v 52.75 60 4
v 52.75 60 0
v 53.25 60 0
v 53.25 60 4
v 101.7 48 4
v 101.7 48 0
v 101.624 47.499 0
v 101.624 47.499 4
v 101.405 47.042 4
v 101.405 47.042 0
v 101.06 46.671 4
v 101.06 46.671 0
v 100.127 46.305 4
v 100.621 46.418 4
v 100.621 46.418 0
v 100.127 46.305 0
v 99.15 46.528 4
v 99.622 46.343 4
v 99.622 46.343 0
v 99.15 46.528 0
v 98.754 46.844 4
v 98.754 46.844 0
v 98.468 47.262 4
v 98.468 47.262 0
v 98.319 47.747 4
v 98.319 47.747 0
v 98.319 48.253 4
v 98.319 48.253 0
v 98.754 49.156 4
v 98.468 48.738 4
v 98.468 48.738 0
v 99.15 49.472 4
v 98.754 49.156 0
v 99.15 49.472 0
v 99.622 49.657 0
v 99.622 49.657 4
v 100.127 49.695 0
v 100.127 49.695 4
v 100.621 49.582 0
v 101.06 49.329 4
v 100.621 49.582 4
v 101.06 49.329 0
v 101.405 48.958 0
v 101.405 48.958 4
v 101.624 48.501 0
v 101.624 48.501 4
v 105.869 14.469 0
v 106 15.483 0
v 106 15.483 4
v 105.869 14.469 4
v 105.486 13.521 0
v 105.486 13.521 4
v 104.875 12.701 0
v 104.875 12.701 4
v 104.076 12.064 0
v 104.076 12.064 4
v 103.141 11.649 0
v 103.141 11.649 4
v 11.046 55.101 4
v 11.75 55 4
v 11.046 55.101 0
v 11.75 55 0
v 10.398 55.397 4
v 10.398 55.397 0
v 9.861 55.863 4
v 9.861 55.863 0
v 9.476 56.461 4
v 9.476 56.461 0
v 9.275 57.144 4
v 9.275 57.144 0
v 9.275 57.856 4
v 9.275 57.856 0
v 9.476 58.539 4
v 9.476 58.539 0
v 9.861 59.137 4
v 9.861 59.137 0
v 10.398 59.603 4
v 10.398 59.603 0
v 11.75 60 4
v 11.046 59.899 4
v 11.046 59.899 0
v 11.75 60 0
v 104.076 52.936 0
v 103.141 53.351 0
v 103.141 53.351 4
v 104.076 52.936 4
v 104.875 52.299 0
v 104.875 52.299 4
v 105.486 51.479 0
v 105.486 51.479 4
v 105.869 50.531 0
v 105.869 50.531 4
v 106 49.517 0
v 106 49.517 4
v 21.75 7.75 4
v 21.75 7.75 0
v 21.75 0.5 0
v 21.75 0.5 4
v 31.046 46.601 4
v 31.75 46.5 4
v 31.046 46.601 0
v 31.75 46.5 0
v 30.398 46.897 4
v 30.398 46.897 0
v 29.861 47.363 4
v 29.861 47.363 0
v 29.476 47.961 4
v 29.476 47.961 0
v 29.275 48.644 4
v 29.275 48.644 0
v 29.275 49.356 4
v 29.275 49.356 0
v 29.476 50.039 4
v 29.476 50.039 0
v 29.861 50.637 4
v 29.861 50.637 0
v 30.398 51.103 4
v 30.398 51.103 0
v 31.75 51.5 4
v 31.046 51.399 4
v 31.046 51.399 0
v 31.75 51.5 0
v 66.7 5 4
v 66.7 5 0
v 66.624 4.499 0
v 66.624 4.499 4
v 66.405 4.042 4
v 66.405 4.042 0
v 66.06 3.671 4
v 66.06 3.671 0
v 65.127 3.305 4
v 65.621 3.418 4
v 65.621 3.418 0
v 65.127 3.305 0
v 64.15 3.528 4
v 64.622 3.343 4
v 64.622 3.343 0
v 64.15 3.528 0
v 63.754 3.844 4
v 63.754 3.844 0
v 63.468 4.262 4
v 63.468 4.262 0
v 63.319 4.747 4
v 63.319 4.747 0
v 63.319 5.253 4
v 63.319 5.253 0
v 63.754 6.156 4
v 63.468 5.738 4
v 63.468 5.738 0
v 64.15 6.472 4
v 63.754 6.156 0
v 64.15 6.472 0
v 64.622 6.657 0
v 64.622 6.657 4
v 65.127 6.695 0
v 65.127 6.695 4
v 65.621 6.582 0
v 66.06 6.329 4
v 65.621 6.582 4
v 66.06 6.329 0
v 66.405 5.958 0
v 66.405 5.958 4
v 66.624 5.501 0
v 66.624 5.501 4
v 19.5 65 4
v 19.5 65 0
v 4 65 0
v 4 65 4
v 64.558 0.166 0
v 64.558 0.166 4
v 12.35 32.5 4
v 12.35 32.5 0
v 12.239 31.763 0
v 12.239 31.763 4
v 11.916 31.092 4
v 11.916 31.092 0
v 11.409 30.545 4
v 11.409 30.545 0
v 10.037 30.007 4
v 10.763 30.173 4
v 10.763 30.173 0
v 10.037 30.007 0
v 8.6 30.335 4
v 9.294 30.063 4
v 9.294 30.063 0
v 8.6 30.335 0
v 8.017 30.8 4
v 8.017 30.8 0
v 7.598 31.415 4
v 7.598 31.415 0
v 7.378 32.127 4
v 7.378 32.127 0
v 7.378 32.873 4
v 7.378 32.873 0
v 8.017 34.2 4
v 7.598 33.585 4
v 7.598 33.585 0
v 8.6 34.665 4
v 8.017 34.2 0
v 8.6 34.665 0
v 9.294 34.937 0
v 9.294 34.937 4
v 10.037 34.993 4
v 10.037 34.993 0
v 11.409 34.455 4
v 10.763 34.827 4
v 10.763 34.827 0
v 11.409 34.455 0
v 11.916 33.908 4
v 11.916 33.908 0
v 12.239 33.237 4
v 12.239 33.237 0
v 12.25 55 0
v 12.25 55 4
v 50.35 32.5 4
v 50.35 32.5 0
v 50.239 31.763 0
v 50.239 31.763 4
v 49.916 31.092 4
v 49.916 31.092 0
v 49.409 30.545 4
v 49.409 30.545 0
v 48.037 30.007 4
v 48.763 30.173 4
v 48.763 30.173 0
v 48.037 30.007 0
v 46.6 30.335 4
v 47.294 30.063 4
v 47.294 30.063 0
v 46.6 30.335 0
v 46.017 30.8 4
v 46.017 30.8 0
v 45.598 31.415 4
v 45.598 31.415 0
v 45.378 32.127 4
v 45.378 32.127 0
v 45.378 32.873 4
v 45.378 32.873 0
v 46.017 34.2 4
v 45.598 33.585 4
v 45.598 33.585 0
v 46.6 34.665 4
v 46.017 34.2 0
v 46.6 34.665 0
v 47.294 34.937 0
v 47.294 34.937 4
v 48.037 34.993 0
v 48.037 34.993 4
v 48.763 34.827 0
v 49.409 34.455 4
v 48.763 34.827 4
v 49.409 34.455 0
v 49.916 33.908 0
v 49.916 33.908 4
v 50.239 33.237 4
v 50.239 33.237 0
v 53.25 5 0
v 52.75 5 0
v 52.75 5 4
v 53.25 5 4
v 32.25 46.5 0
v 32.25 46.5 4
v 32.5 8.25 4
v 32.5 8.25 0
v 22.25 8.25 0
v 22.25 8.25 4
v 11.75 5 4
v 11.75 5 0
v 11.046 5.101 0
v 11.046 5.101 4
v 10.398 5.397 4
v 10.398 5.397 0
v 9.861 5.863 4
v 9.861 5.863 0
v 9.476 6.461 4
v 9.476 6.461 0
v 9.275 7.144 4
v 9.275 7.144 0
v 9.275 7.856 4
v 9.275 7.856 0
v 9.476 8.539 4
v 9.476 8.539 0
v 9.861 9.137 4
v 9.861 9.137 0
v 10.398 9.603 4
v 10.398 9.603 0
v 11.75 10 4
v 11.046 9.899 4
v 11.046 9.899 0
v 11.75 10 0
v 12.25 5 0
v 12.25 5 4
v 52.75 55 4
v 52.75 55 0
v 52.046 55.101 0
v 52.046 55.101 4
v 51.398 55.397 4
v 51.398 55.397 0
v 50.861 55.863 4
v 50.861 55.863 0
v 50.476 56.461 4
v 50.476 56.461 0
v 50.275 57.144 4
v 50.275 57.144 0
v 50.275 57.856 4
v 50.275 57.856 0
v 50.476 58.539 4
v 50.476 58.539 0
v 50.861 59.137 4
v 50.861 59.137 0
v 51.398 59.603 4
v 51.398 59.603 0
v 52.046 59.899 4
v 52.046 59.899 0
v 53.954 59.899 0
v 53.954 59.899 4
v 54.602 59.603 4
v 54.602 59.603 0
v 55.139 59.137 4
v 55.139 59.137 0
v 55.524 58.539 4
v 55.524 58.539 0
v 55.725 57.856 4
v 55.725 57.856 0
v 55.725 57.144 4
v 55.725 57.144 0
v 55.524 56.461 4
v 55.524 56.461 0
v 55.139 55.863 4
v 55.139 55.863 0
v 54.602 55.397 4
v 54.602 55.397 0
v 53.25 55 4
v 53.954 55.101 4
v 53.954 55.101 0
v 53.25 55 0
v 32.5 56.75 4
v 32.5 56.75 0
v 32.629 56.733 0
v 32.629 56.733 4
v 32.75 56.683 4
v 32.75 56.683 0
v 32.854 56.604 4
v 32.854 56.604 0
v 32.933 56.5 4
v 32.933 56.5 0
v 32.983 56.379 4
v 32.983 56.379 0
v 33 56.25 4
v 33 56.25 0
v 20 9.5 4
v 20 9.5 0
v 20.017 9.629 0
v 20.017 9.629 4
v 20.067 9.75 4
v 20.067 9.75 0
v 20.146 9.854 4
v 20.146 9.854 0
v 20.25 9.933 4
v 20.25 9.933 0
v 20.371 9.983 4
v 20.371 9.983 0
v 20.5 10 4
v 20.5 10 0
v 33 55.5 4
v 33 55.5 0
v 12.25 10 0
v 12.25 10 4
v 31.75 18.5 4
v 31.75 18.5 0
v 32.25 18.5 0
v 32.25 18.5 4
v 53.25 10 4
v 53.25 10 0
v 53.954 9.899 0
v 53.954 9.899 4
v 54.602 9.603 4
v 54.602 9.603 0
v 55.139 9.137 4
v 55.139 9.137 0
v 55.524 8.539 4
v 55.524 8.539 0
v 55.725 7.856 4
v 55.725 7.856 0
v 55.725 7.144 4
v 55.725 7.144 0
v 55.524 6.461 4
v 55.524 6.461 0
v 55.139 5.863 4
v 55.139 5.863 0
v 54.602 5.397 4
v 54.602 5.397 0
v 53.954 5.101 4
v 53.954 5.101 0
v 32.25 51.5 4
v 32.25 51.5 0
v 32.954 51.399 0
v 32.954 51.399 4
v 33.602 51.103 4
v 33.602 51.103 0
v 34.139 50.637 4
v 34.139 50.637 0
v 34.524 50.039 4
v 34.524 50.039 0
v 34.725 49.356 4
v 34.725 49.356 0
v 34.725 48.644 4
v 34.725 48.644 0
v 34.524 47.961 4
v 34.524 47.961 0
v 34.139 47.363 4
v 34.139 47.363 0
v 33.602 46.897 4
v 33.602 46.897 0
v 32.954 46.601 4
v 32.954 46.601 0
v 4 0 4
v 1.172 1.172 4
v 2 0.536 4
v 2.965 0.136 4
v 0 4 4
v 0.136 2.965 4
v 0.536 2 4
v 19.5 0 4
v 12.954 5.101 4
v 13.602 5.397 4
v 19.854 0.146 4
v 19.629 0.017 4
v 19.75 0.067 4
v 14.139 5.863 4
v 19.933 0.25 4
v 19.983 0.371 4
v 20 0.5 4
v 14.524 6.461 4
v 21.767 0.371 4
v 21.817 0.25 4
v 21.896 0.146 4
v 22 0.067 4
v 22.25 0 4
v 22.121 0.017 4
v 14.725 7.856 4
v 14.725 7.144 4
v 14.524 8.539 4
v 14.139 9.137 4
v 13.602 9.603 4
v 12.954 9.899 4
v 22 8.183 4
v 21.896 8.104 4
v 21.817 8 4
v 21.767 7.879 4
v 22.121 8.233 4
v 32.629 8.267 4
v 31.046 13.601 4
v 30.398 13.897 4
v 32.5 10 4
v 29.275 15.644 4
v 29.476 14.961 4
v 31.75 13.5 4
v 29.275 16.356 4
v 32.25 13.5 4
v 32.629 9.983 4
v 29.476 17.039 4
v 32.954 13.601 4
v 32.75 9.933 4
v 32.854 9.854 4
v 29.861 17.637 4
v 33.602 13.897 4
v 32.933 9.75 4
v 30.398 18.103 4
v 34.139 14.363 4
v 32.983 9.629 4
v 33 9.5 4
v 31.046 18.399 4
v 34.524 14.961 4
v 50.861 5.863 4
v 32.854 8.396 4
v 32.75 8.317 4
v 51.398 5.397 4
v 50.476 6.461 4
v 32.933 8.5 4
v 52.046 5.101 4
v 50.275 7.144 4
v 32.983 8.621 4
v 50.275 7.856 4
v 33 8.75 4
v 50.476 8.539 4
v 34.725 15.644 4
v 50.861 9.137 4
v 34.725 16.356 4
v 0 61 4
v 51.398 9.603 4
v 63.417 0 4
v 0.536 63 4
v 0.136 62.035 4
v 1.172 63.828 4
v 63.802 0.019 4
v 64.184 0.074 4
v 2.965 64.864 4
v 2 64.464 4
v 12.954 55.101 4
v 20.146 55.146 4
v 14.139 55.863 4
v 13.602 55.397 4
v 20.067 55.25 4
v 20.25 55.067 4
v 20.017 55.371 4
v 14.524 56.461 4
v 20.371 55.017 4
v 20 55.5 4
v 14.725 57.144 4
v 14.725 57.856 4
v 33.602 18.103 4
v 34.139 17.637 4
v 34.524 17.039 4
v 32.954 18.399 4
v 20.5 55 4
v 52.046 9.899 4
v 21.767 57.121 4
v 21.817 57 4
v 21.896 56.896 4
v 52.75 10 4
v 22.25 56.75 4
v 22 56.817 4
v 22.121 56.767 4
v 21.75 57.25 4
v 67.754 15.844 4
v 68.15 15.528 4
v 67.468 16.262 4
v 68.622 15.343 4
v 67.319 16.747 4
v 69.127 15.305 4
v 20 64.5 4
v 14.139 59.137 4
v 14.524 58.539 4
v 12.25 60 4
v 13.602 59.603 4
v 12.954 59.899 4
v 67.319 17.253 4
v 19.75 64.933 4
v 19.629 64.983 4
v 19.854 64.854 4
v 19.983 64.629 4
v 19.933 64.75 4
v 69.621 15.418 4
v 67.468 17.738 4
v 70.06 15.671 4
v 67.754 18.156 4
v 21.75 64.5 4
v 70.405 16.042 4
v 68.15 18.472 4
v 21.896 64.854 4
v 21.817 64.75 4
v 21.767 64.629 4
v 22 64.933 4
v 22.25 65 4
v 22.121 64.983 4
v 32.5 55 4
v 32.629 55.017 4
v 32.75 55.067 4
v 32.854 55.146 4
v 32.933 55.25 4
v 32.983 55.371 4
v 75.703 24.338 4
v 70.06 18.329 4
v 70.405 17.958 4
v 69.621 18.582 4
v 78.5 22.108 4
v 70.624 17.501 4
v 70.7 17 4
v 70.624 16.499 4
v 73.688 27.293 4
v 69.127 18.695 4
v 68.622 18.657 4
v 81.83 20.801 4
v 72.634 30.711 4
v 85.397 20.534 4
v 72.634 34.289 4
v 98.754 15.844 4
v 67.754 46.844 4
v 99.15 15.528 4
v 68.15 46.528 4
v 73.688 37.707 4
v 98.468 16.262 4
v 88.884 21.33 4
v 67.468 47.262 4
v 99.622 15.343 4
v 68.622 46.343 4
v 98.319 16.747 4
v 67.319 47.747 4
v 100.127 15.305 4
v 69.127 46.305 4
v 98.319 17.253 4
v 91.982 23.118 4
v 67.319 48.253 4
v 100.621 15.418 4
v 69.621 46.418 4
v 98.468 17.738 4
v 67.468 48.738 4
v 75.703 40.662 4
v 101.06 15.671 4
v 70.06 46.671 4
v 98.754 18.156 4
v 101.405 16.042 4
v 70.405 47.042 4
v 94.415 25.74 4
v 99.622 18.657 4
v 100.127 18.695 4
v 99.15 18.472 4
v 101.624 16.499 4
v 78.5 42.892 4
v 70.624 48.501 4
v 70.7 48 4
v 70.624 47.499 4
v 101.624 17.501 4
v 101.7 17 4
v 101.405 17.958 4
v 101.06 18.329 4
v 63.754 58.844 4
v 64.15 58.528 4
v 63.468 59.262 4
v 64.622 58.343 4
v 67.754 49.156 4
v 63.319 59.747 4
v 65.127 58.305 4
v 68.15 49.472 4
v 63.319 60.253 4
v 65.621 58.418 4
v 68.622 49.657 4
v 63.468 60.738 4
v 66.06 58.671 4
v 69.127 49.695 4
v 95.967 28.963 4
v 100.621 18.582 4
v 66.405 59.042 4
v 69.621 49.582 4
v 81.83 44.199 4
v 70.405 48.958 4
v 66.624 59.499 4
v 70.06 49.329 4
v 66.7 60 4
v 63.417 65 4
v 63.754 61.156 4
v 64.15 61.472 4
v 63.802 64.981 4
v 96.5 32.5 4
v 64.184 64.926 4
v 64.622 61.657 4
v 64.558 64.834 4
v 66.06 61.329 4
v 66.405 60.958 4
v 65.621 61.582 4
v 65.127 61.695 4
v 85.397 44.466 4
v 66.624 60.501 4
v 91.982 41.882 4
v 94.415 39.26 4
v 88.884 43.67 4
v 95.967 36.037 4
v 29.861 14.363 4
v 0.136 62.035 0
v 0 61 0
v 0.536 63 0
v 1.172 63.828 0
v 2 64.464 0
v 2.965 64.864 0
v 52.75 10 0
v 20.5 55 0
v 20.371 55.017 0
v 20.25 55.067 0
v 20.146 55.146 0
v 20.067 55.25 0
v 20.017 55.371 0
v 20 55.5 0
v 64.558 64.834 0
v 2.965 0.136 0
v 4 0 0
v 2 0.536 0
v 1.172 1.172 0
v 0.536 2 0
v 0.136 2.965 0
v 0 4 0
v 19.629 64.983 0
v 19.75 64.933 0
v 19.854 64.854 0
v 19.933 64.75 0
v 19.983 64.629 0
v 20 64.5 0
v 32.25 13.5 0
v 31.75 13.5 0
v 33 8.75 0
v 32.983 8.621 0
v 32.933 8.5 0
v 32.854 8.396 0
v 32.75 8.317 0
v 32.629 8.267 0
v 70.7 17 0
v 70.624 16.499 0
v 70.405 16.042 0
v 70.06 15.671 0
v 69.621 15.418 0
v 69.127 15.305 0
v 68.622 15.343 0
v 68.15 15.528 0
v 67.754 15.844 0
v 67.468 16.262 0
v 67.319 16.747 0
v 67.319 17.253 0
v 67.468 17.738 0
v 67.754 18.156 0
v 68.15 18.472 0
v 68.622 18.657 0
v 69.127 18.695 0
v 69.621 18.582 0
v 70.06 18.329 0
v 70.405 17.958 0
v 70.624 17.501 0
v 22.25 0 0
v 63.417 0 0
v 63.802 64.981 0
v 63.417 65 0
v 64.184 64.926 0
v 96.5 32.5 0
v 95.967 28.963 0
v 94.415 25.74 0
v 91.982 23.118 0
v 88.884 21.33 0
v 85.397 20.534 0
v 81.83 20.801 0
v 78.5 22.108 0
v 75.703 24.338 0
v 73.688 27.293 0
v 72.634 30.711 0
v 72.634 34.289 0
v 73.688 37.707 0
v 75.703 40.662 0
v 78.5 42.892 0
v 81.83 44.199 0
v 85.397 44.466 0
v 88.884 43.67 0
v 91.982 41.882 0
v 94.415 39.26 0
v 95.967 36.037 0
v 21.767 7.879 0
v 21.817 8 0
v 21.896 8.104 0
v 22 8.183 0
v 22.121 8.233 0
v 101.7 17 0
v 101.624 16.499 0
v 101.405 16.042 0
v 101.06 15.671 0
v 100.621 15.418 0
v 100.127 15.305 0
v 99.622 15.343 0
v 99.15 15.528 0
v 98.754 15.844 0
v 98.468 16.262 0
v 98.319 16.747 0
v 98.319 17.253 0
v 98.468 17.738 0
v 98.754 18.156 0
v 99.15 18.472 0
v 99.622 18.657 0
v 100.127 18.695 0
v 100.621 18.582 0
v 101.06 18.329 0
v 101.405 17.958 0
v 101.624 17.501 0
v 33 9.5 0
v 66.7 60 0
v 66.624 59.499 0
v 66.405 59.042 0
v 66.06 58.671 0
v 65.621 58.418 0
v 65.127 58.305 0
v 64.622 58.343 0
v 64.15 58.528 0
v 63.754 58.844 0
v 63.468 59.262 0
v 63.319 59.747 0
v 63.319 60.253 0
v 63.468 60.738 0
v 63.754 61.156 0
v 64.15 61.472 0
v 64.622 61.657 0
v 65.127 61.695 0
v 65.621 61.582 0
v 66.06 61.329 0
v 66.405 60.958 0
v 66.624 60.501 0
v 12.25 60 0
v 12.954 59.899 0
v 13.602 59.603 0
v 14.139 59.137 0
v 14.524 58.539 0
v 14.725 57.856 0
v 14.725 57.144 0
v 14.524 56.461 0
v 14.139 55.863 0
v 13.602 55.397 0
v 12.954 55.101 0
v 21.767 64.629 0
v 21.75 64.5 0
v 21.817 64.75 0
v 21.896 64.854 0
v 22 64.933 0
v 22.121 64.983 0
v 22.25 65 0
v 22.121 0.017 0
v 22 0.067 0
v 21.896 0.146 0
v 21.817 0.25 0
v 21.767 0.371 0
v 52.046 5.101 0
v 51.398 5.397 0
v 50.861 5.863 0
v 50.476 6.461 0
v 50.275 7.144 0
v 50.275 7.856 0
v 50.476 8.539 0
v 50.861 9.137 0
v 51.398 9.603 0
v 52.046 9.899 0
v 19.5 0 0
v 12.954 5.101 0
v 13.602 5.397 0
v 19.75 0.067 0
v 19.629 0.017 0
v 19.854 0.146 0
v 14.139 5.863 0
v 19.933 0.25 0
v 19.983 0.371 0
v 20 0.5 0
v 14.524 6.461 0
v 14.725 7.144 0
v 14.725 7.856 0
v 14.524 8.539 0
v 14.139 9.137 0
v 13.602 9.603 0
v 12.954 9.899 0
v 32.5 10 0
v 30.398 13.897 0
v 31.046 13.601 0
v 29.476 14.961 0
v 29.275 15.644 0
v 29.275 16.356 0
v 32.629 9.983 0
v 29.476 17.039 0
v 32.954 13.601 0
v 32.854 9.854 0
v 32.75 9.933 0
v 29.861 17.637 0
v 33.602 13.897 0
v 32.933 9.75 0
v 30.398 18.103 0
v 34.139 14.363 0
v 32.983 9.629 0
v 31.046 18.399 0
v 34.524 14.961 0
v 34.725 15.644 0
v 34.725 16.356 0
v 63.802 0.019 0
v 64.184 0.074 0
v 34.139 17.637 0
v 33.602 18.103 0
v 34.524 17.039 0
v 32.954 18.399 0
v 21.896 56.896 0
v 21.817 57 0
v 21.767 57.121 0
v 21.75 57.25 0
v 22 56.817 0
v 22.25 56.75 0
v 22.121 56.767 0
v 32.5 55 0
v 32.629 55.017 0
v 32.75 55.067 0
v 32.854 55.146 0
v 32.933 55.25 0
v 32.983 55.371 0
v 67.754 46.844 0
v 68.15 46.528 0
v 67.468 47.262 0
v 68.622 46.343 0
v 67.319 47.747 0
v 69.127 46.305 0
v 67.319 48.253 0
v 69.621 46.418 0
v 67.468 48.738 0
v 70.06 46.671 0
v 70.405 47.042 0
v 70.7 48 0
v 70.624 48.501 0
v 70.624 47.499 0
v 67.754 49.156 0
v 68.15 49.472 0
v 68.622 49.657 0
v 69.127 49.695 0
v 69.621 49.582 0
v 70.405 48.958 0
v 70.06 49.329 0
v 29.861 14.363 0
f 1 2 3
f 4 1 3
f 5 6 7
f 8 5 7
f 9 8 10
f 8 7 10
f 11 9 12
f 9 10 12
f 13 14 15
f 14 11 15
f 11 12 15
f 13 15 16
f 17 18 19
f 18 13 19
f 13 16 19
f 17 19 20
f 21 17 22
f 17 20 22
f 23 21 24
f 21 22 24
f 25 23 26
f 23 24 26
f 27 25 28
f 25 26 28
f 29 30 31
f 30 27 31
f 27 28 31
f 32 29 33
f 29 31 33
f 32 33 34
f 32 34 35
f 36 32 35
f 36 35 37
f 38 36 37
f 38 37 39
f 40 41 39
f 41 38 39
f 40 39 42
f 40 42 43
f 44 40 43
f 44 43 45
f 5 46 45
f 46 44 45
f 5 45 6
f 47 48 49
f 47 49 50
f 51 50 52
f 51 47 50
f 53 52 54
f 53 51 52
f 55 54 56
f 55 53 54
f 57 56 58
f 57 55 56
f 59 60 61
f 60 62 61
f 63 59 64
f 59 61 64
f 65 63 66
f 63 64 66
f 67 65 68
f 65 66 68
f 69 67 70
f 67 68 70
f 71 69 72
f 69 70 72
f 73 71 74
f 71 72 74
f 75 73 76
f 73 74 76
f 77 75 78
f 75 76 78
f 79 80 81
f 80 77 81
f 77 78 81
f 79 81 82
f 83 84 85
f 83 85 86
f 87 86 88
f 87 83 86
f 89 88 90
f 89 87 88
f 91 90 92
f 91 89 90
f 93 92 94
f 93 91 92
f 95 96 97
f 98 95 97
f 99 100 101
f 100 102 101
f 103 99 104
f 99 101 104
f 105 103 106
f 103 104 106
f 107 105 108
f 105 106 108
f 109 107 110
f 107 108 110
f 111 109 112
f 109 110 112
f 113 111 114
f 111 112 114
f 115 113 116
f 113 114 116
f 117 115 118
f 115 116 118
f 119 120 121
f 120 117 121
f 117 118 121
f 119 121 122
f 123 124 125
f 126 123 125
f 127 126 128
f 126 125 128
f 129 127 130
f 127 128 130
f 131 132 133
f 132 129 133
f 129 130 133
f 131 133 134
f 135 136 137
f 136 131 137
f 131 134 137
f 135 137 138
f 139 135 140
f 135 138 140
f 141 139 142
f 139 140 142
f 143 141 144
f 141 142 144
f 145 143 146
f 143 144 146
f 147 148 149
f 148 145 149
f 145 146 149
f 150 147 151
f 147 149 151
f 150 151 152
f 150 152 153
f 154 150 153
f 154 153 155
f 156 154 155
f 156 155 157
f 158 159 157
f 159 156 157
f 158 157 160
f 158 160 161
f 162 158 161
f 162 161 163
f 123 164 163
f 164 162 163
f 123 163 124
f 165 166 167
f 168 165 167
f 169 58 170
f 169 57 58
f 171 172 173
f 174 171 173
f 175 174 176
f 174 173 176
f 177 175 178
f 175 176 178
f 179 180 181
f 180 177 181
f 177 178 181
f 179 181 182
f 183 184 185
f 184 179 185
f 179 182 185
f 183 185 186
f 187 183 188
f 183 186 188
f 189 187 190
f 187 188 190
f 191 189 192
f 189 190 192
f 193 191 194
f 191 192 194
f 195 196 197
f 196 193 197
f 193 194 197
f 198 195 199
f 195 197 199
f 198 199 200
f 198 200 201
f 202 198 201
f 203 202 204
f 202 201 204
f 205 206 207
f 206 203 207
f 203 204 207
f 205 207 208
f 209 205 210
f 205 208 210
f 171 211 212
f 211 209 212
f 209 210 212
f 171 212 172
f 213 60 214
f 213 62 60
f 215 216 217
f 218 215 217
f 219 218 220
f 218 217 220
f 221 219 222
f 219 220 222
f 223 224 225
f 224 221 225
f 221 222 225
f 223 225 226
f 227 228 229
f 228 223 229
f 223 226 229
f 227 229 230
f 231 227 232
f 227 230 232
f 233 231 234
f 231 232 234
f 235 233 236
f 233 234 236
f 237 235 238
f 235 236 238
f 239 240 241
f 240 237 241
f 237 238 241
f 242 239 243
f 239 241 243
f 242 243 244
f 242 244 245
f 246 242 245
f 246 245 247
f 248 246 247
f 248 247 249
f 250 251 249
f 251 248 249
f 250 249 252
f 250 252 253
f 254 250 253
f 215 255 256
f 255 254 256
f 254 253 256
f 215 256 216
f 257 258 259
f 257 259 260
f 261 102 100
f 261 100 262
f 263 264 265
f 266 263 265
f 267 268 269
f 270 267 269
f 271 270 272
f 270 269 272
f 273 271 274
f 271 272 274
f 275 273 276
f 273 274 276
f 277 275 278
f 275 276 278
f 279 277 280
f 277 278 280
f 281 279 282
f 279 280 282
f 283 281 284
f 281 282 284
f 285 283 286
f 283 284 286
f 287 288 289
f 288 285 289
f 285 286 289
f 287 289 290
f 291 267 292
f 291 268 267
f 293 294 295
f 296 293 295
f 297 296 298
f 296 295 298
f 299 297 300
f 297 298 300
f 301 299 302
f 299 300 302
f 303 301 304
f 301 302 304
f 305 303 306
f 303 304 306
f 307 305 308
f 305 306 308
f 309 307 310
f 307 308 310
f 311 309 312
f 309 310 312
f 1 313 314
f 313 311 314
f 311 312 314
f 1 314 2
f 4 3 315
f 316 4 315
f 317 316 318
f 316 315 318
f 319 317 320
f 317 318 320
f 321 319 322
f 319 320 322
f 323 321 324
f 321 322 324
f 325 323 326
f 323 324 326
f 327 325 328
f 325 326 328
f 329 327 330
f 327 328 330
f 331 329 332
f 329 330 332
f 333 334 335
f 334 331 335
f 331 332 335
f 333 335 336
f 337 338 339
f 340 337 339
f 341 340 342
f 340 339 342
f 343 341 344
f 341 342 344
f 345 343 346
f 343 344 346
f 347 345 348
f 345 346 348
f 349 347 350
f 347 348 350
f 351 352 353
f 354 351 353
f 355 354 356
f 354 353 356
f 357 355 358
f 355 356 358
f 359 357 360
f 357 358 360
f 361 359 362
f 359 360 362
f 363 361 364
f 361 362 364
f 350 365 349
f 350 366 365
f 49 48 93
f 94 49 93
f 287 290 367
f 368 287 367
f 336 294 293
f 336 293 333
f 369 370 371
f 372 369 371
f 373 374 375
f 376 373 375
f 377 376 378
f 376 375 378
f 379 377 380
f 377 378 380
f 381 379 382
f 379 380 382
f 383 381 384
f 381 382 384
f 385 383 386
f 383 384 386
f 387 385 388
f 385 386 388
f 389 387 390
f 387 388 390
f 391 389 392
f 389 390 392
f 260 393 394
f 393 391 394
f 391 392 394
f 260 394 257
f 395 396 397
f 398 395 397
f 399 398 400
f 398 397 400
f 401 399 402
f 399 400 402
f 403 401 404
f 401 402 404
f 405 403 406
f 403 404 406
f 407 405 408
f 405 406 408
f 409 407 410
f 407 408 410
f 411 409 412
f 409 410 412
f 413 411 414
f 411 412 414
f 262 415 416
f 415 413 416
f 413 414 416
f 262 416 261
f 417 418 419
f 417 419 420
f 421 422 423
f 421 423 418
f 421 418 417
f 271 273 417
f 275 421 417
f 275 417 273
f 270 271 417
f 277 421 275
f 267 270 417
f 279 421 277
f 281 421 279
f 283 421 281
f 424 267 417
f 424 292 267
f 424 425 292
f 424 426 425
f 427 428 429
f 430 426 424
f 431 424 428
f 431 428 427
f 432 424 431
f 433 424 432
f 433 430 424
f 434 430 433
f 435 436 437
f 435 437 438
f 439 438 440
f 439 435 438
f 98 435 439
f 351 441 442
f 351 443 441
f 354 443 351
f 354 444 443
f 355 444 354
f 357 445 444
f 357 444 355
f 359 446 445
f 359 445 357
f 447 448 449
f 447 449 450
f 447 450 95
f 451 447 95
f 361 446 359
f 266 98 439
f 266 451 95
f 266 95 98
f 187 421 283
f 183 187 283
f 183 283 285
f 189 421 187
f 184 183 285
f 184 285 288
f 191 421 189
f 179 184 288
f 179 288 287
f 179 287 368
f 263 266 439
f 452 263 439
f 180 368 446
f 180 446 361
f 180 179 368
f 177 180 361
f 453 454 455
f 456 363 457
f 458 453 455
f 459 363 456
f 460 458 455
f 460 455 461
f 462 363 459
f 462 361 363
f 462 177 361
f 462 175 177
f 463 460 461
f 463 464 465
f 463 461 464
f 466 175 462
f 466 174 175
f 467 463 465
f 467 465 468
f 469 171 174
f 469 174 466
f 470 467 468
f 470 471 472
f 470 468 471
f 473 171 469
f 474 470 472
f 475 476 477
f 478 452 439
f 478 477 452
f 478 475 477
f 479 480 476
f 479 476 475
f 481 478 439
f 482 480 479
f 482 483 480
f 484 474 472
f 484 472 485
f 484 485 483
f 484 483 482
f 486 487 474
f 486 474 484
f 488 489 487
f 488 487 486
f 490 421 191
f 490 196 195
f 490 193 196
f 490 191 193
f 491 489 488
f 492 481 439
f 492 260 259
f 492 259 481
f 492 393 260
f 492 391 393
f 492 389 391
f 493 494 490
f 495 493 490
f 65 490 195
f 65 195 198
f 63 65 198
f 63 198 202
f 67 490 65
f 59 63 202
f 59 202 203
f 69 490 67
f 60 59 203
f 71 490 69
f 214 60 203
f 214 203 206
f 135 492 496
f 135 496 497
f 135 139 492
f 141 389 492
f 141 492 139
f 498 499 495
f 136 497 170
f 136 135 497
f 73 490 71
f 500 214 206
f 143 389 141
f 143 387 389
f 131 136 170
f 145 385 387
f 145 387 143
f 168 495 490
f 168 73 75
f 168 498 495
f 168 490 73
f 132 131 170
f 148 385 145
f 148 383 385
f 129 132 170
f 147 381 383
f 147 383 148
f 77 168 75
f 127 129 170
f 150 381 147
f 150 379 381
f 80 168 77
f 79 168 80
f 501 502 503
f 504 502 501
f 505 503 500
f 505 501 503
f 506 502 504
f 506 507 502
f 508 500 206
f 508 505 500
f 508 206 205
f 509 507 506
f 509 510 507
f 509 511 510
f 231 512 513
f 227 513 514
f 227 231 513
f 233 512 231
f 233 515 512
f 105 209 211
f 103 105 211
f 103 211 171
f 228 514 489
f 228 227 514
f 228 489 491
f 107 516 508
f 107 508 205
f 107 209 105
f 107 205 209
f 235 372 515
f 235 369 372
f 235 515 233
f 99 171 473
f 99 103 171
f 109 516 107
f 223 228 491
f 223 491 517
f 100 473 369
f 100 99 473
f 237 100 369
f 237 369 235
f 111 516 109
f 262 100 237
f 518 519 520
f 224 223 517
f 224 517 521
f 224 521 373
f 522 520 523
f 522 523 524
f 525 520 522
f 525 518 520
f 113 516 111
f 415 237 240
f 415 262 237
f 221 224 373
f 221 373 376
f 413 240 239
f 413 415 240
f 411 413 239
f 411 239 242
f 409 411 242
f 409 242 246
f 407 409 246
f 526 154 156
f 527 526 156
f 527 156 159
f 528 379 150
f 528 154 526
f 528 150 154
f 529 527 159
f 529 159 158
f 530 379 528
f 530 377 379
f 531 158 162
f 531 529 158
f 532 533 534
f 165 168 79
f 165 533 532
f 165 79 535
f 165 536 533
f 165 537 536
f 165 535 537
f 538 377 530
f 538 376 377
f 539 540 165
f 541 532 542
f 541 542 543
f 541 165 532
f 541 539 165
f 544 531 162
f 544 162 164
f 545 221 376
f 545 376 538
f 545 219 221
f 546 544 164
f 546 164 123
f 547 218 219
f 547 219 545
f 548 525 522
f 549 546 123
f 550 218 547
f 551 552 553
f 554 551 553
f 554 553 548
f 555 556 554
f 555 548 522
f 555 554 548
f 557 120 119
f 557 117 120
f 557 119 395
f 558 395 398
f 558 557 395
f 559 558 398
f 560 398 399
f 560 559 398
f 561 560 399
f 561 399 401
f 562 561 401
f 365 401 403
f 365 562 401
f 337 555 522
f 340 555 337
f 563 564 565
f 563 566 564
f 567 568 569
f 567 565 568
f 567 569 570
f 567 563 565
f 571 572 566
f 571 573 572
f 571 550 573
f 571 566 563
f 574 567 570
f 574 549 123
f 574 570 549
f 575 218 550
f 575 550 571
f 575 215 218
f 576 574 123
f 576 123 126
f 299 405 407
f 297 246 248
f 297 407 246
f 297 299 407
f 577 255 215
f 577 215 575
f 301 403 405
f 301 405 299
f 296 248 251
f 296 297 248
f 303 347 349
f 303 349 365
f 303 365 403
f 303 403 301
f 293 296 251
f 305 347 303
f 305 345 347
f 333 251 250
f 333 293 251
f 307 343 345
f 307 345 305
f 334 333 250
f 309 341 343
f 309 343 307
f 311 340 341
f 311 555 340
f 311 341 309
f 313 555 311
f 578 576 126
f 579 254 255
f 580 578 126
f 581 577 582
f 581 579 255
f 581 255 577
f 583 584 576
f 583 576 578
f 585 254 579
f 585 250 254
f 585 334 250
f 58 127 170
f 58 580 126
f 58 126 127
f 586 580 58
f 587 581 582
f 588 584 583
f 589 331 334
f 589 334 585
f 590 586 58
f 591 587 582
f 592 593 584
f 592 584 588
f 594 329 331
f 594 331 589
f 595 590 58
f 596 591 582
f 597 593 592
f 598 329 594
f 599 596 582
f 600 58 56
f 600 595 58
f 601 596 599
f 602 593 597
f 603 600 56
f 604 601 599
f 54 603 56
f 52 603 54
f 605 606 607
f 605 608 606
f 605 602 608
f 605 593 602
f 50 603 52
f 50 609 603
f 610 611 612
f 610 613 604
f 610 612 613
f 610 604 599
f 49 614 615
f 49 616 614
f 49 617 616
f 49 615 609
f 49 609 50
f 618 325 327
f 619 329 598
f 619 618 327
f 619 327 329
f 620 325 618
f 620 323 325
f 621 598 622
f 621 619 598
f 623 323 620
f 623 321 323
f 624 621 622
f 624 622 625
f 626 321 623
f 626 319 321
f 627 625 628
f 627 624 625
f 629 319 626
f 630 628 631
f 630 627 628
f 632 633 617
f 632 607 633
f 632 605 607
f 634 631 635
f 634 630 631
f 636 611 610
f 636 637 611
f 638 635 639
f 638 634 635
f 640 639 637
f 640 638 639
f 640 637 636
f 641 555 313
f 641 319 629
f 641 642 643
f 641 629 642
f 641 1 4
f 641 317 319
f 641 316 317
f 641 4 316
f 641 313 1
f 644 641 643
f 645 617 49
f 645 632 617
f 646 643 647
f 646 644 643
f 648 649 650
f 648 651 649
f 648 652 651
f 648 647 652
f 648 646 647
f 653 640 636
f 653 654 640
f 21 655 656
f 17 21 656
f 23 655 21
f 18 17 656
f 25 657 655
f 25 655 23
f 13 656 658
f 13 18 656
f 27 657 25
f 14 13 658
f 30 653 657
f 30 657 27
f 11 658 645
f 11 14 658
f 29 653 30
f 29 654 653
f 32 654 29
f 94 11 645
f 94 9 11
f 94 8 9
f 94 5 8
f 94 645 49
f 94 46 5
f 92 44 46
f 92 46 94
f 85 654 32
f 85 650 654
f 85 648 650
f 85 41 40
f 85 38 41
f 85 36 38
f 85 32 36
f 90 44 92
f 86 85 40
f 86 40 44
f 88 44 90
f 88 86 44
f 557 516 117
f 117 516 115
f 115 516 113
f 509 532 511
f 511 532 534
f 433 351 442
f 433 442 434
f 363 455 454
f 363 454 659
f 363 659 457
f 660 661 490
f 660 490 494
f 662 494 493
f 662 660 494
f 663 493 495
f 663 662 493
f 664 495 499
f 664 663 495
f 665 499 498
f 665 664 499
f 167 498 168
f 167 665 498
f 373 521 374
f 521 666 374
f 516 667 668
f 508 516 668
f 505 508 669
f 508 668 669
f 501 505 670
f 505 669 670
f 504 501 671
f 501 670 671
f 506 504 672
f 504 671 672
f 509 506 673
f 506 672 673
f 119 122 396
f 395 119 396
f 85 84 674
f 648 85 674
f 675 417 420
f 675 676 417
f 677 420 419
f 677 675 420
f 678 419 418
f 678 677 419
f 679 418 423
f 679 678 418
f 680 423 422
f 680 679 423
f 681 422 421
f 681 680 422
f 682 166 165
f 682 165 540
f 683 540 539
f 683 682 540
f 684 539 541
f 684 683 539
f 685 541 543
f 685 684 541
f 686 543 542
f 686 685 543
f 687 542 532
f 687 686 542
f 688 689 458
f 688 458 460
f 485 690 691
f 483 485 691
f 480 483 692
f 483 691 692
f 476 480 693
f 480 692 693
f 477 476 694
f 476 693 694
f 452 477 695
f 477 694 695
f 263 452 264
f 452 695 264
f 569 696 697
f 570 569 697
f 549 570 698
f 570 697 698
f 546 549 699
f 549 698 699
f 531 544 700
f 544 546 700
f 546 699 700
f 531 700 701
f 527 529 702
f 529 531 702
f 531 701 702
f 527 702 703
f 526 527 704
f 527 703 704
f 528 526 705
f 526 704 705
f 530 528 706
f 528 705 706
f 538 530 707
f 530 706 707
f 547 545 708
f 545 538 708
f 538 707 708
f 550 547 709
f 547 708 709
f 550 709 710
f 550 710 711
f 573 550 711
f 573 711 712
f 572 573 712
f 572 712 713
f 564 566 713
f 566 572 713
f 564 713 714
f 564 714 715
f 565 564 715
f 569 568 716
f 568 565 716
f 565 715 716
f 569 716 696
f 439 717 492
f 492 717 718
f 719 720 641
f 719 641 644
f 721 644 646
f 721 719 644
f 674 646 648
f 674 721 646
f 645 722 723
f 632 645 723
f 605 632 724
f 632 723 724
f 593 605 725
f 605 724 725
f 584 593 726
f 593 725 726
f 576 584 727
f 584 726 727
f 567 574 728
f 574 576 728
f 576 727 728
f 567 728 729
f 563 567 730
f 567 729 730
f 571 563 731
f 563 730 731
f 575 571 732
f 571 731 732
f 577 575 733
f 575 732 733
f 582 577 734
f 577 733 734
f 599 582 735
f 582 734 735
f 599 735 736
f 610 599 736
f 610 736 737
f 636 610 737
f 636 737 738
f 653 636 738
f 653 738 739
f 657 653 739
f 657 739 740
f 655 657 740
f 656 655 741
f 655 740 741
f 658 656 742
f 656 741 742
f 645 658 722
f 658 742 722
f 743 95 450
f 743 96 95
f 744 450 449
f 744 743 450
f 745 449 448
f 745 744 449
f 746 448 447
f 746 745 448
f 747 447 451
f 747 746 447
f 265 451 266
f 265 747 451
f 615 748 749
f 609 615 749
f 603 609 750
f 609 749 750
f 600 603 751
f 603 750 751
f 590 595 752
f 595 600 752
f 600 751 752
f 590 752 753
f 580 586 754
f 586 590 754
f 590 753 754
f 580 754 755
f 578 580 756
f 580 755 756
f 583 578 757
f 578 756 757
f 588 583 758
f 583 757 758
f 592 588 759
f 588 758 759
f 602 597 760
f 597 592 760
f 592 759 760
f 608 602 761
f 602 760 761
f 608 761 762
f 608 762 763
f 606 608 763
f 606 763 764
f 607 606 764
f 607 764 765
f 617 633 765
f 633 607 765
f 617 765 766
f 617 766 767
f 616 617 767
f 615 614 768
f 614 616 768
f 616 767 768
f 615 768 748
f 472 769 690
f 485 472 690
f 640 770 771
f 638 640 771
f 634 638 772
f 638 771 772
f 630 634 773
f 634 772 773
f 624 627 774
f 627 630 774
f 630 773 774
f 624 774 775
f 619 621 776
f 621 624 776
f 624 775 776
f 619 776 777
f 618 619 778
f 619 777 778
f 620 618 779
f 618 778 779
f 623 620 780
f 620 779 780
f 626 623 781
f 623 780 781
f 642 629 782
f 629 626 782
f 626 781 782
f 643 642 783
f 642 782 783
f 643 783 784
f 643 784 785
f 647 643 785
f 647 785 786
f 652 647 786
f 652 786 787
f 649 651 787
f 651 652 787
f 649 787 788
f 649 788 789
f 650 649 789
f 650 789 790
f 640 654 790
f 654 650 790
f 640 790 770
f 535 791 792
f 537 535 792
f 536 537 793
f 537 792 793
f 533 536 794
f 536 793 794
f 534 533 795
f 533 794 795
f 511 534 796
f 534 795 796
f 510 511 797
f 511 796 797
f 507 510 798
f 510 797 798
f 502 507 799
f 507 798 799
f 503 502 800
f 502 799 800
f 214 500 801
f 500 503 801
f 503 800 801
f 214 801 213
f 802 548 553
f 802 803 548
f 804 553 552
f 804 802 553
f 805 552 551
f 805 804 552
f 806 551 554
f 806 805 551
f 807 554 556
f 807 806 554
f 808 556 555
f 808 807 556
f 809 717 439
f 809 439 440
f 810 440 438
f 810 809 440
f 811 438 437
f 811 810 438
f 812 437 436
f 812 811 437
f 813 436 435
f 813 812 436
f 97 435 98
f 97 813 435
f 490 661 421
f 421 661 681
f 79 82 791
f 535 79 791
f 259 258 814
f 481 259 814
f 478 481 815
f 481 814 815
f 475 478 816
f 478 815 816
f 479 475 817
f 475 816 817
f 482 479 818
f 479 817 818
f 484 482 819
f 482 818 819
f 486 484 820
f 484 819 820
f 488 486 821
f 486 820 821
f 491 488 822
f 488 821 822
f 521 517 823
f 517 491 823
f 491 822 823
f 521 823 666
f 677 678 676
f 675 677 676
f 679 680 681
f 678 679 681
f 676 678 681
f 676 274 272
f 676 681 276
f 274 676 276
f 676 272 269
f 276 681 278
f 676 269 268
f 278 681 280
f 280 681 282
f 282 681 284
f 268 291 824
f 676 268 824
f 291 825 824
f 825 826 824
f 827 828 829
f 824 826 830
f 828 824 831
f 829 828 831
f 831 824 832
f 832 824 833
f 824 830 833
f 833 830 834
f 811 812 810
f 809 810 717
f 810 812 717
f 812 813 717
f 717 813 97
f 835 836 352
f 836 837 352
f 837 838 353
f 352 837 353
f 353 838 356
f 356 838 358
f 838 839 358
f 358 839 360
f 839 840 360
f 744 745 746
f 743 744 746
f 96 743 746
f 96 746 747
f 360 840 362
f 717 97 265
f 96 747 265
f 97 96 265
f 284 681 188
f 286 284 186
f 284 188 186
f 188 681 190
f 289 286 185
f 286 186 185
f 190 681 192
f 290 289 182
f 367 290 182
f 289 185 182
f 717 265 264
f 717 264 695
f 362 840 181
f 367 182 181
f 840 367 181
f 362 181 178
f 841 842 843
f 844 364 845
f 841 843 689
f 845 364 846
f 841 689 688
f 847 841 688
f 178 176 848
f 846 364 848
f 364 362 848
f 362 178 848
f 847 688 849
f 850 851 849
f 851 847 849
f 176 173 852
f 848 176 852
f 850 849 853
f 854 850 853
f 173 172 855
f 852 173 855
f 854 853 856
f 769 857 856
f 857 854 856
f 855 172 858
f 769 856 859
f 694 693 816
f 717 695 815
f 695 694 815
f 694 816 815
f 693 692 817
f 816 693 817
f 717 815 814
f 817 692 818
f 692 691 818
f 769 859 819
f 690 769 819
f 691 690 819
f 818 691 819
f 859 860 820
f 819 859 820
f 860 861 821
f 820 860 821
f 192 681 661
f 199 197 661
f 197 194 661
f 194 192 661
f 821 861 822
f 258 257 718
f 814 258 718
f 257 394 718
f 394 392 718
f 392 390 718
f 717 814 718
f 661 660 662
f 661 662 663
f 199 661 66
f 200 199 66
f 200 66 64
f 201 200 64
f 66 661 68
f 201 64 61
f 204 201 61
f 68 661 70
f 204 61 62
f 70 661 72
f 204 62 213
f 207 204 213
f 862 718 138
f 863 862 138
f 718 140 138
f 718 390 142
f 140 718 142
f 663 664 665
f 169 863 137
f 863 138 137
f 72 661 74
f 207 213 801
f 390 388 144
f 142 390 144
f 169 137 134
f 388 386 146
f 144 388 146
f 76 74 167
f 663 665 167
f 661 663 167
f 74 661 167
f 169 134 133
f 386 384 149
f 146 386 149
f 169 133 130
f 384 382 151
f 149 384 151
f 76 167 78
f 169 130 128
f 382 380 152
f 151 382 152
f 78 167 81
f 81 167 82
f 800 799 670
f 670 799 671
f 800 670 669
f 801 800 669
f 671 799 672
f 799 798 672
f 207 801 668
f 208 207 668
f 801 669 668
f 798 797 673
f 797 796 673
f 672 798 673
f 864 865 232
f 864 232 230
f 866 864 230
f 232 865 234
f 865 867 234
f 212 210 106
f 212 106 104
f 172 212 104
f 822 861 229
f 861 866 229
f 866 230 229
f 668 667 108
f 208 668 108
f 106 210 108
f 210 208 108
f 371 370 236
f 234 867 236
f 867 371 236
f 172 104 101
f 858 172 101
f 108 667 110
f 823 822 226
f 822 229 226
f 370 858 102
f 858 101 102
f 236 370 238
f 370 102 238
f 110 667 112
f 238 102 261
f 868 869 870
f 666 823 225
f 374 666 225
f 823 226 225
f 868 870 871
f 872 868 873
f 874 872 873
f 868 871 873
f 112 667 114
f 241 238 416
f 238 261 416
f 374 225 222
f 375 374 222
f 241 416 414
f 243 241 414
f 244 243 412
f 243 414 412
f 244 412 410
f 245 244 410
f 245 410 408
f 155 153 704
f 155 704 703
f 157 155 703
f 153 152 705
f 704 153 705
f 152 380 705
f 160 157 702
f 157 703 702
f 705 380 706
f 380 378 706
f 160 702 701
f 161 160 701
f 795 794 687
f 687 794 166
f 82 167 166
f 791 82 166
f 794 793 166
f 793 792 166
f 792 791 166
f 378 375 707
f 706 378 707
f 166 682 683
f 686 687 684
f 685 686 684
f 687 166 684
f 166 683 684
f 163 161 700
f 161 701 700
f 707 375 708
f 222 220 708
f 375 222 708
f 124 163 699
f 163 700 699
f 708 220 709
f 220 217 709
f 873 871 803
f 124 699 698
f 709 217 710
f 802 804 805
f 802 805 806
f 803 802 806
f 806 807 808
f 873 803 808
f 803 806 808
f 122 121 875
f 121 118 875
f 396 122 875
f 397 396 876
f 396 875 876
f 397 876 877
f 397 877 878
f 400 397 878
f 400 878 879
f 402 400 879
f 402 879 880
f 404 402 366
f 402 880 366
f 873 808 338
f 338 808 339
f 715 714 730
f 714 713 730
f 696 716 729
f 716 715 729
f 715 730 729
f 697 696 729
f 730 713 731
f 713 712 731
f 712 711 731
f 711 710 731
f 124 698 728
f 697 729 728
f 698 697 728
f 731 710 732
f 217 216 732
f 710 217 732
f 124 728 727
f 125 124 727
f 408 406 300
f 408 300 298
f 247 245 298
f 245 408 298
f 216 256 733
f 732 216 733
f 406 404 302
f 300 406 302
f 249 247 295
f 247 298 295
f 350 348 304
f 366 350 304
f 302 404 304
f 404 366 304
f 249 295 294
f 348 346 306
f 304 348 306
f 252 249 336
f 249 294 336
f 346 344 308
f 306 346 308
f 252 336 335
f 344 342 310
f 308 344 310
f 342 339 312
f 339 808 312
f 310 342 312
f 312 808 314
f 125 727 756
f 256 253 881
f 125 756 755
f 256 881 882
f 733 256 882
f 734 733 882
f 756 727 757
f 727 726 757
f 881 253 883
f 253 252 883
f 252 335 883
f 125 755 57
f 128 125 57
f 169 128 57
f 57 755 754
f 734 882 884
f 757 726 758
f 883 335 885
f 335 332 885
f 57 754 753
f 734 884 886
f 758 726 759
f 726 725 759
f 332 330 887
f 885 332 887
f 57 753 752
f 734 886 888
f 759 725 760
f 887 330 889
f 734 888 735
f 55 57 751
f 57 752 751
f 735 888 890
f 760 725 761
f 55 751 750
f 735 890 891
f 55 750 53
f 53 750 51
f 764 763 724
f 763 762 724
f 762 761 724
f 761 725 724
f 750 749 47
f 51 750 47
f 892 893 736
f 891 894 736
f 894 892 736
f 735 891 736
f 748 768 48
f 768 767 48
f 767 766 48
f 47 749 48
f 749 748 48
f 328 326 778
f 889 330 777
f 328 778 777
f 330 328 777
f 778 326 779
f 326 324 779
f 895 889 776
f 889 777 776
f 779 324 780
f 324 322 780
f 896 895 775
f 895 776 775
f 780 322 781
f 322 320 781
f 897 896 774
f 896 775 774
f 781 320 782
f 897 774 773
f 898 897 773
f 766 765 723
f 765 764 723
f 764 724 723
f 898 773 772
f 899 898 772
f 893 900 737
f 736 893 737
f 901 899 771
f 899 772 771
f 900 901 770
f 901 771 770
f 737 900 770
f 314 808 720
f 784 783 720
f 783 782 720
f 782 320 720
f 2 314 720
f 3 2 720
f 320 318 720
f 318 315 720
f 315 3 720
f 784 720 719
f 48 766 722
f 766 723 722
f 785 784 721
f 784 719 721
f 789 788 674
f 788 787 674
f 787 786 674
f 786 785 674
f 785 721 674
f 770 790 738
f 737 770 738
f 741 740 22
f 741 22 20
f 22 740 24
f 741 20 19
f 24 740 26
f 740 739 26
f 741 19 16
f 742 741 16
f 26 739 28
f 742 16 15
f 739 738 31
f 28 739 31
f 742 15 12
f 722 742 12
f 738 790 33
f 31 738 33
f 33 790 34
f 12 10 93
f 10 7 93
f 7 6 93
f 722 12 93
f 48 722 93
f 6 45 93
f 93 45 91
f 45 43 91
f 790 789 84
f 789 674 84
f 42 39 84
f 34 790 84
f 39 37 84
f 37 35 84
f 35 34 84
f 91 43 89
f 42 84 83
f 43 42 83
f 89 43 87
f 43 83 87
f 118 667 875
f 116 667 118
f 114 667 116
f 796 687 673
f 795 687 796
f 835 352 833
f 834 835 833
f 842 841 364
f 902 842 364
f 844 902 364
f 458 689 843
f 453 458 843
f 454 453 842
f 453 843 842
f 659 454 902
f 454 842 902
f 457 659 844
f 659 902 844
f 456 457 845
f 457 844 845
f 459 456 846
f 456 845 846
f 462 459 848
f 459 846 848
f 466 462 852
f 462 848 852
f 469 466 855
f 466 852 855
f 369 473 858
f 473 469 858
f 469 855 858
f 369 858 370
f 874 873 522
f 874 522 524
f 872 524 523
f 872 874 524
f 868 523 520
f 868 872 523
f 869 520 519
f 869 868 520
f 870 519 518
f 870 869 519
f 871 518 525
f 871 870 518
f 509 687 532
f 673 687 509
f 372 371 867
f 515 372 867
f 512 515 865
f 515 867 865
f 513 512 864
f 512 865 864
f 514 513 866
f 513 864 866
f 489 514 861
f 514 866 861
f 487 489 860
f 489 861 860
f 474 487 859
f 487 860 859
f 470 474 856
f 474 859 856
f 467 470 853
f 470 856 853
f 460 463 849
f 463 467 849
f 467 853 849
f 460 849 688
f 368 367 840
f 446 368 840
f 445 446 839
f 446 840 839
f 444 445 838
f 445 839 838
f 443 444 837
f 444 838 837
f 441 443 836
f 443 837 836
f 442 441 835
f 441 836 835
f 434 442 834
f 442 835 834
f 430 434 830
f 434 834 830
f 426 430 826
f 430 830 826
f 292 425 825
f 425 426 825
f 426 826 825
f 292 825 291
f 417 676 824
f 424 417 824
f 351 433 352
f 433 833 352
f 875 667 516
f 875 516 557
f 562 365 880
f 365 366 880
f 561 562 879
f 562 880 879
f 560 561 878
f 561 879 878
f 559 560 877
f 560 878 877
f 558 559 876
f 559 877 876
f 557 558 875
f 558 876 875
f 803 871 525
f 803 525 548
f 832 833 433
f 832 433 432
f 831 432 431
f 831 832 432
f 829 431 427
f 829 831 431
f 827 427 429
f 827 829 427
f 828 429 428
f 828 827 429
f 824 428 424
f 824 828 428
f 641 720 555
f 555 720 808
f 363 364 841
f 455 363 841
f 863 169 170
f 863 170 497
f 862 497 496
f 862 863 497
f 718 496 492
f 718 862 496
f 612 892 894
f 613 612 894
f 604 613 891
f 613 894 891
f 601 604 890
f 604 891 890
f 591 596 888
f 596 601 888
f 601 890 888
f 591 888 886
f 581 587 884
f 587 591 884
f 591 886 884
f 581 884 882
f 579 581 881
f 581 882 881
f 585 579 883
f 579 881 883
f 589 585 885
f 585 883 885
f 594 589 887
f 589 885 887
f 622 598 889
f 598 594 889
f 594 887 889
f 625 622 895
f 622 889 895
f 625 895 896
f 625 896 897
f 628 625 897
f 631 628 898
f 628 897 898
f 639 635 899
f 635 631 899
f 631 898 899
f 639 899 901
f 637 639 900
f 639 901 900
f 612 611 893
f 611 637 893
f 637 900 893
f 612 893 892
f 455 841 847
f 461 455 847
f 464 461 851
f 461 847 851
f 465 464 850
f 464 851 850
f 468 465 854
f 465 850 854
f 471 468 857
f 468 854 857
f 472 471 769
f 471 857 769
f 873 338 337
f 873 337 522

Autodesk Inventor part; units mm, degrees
ref_plane "YZ Plane" through (0, 0, 0) normal (1, 0, 0) x (0, 1, 0)
ref_plane "XZ Plane" through (0, 0, 0) normal (0, 1, 0) x (-1, 0, 0)
ref_plane "XY Plane" through (0, 0, 0) normal (0, 0, 1) x (1, 0, 0)
sketch "Szkic1" plane through (0, 0, 0) normal (0, 0, 1) x (1, 0, 0)
  line L0 (0, 61) -> (0, 4)
  line L1 (106, 15.4829) -> (106, 49.5171)
  line L2 (103.141, 53.3509) -> (64.5584, 64.8338)
  line L3 (103.141, 11.6491) -> (64.5584, 0.1662)
  arc A0 (4, 65) -> (0, 61) centre (4, 61) ccw
  arc A1 (64.5584, 64.8338) -> (63.4174, 65) centre (63.4174, 61) ccw
  arc A2 (106, 49.5171) -> (103.141, 53.3509) centre (102, 49.5171) ccw
  arc A3 (103.141, 11.6491) -> (106, 15.4829) centre (102, 15.4829) ccw
  arc A4 (63.4174, 0) -> (64.5584, 0.1662) centre (63.4174, 4) ccw
  arc A5 (0, 4) -> (4, 0) centre (4, 4) ccw
  line L4 (0, 0) -> (20, 0)
  line L5 (20, 0.5) -> (20, 9.5)
  line L6 (20.5, 10) -> (32.5, 10)
  line L7 (33, 9.5) -> (33, 8.75)
  line L8 (32.5, 8.25) -> (22.25, 8.25)
  line L9 (21.75, 7.75) -> (21.75, 0.5)
  line L10 (4, 0) -> (19.5, 0)
  line L11 (22.25, 0) -> (63.4174, 0)
  arc A6 (19.5, 0) -> (20, 0.5) centre (19.5, 0.5) ccw
  arc A7 (20.5, 10) -> (20, 9.5) centre (20.5, 9.5) ccw
  arc A8 (33, 9.5) -> (32.5, 10) centre (32.5, 9.5) ccw
  arc A9 (32.5, 8.25) -> (33, 8.75) centre (32.5, 8.75) ccw
  arc A10 (22.25, 8.25) -> (21.75, 7.75) centre (22.25, 7.75) ccw
  arc A11 (21.75, 0.5) -> (22.25, 0) centre (22.25, 0.5) ccw
  line L12 (20, 64.5) -> (20, 55.5)
  line L13 (20.5, 55) -> (32.5, 55)
  line L14 (33, 55.5) -> (33, 56.25)
  line L15 (32.5, 56.75) -> (22.25, 56.75)
  line L16 (21.75, 57.25) -> (21.75, 64.5)
  arc A12 (20, 64.5) -> (19.5, 65) centre (19.5, 64.5) ccw
  arc A13 (20, 55.5) -> (20.5, 55) centre (20.5, 55.5) ccw
  arc A14 (32.5, 55) -> (33, 55.5) centre (32.5, 55.5) ccw
  arc A15 (33, 56.25) -> (32.5, 56.75) centre (32.5, 56.25) ccw
  arc A16 (21.75, 57.25) -> (22.25, 56.75) centre (22.25, 57.25) ccw
  arc A17 (22.25, 65) -> (21.75, 64.5) centre (22.25, 64.5) ccw
  line L17 (63.4174, 65) -> (22.25, 65)
  line L18 (19.5, 65) -> (4, 65)
  circle A18 centre (65, 5) radius 1.7
  circle A19 centre (65, 60) radius 1.7
  circle A20 centre (69, 48) radius 1.7
  circle A21 centre (100, 48) radius 1.7
  circle A22 centre (69, 17) radius 1.7
  circle A23 centre (100, 17) radius 1.7
  circle A24 centre (84.5, 32.5) radius 12
  circle A25 centre (9.85, 32.5) radius 2.5
  circle A26 centre (47.85, 32.5) radius 2.5
  arc A27 (11.75, 60) -> (11.75, 55) centre (11.75, 57.5) ccw
  arc A28 (12.25, 55) -> (12.25, 60) centre (12.25, 57.5) ccw
  line L19 (11.75, 60) -> (12.25, 60)
  line L20 (11.75, 55) -> (12.25, 55)
  arc A29 (52.75, 60) -> (52.75, 55) centre (52.75, 57.5) ccw
  arc A30 (53.25, 55) -> (53.25, 60) centre (53.25, 57.5) ccw
  line L21 (52.75, 60) -> (53.25, 60)
  line L22 (52.75, 55) -> (53.25, 55)
  arc A31 (11.75, 10) -> (11.75, 5) centre (11.75, 7.5) ccw
  arc A32 (12.25, 5) -> (12.25, 10) centre (12.25, 7.5) ccw
  line L23 (11.75, 5) -> (12.25, 5)
  line L24 (11.75, 10) -> (12.25, 10)
  arc A33 (52.75, 10) -> (52.75, 5) centre (52.75, 7.5) ccw
  arc A34 (53.25, 5) -> (53.25, 10) centre (53.25, 7.5) ccw
  line L25 (52.75, 5) -> (53.25, 5)
  line L26 (52.75, 10) -> (53.25, 10)
  arc A35 (31.75, 51.5) -> (31.75, 46.5) centre (31.75, 49) ccw
  arc A36 (32.25, 46.5) -> (32.25, 51.5) centre (32.25, 49) ccw
  line L27 (31.75, 51.5) -> (32.25, 51.5)
  line L28 (31.75, 46.5) -> (32.25, 46.5)
  arc A37 (31.75, 18.5) -> (31.75, 13.5) centre (31.75, 16) ccw
  arc A38 (32.25, 13.5) -> (32.25, 18.5) centre (32.25, 16) ccw
  line L29 (31.75, 13.5) -> (32.25, 13.5)
  line L30 (31.75, 18.5) -> (32.25, 18.5)
  point P0 (106, 12.5)
  point P1 (106, 52.5)
  point P2 (20, 10)
  point P3 (33, 10)
  point P4 (33, 8.25)
  point P5 (21.75, 8.25)
  point P6 (21.75, 56.75)
  dimension "d2" = 106
  dimension "d3" = 40
  dimension "d5" = 4
  dimension "d6" = 20
  dimension "d7" = 10
  dimension "d8" = 13
  dimension "d9" = 1.75
  dimension "d10" = 11.25
  dimension "d11" = 0.5
  dimension "d12" = 3.4
  dimension "d13" = 65
  dimension "d14" = 5
  dimension "d16" = 3.4
  dimension "d18" = 69
  dimension "d19" = 3.4
  dimension "d20" = 3.4
  dimension "d21" = 3.4
  dimension "d24" = 69
  dimension "d25" = 31
  dimension "d26" = 31
  dimension "d27" = 24
  dimension "d28" = 84.5
  dimension "d29" = 5
  dimension "d30" = 5
  dimension "d31" = 9.85
  dimension "d32" = 38
  dimension "d33" = 5
  dimension "d35" = 5
  dimension "d36" = 9.25
  dimension "d37" = 5
  dimension "d39" = 5
  dimension "d40" = 35.5
  dimension "d42" = 5
  dimension "d47" = 5
  dimension "d48" = 5
extrude "Płyta1" add sketch "Szkic1" along normal blind 4
equation "\"d49\" = Grubość"
equation "\"PromieńGięcia\" = Grubość"
equation "\"SzerokośćGięciaPodcięcia\" = Grubość"
equation "\"GłębokośćGięciaPodcięcia\" = 0.5 * Grubość"
equation "\"RozmiarPodcięciaNarożnika\" = 4 * Grubość"
equation "\"MinimalnaPozostałość\" = 2 * Grubość"
equation "\"PromieńPrzejścia\" = PromieńGięcia"
equation "\"Rozmiar_promienia_Jacobiego\" = PromieńGięcia"
equation "\"Wielk_odstępu\" = Grubość"
equation "\"Grubość\" = 4"
properties part number "podstawa_prawa"
